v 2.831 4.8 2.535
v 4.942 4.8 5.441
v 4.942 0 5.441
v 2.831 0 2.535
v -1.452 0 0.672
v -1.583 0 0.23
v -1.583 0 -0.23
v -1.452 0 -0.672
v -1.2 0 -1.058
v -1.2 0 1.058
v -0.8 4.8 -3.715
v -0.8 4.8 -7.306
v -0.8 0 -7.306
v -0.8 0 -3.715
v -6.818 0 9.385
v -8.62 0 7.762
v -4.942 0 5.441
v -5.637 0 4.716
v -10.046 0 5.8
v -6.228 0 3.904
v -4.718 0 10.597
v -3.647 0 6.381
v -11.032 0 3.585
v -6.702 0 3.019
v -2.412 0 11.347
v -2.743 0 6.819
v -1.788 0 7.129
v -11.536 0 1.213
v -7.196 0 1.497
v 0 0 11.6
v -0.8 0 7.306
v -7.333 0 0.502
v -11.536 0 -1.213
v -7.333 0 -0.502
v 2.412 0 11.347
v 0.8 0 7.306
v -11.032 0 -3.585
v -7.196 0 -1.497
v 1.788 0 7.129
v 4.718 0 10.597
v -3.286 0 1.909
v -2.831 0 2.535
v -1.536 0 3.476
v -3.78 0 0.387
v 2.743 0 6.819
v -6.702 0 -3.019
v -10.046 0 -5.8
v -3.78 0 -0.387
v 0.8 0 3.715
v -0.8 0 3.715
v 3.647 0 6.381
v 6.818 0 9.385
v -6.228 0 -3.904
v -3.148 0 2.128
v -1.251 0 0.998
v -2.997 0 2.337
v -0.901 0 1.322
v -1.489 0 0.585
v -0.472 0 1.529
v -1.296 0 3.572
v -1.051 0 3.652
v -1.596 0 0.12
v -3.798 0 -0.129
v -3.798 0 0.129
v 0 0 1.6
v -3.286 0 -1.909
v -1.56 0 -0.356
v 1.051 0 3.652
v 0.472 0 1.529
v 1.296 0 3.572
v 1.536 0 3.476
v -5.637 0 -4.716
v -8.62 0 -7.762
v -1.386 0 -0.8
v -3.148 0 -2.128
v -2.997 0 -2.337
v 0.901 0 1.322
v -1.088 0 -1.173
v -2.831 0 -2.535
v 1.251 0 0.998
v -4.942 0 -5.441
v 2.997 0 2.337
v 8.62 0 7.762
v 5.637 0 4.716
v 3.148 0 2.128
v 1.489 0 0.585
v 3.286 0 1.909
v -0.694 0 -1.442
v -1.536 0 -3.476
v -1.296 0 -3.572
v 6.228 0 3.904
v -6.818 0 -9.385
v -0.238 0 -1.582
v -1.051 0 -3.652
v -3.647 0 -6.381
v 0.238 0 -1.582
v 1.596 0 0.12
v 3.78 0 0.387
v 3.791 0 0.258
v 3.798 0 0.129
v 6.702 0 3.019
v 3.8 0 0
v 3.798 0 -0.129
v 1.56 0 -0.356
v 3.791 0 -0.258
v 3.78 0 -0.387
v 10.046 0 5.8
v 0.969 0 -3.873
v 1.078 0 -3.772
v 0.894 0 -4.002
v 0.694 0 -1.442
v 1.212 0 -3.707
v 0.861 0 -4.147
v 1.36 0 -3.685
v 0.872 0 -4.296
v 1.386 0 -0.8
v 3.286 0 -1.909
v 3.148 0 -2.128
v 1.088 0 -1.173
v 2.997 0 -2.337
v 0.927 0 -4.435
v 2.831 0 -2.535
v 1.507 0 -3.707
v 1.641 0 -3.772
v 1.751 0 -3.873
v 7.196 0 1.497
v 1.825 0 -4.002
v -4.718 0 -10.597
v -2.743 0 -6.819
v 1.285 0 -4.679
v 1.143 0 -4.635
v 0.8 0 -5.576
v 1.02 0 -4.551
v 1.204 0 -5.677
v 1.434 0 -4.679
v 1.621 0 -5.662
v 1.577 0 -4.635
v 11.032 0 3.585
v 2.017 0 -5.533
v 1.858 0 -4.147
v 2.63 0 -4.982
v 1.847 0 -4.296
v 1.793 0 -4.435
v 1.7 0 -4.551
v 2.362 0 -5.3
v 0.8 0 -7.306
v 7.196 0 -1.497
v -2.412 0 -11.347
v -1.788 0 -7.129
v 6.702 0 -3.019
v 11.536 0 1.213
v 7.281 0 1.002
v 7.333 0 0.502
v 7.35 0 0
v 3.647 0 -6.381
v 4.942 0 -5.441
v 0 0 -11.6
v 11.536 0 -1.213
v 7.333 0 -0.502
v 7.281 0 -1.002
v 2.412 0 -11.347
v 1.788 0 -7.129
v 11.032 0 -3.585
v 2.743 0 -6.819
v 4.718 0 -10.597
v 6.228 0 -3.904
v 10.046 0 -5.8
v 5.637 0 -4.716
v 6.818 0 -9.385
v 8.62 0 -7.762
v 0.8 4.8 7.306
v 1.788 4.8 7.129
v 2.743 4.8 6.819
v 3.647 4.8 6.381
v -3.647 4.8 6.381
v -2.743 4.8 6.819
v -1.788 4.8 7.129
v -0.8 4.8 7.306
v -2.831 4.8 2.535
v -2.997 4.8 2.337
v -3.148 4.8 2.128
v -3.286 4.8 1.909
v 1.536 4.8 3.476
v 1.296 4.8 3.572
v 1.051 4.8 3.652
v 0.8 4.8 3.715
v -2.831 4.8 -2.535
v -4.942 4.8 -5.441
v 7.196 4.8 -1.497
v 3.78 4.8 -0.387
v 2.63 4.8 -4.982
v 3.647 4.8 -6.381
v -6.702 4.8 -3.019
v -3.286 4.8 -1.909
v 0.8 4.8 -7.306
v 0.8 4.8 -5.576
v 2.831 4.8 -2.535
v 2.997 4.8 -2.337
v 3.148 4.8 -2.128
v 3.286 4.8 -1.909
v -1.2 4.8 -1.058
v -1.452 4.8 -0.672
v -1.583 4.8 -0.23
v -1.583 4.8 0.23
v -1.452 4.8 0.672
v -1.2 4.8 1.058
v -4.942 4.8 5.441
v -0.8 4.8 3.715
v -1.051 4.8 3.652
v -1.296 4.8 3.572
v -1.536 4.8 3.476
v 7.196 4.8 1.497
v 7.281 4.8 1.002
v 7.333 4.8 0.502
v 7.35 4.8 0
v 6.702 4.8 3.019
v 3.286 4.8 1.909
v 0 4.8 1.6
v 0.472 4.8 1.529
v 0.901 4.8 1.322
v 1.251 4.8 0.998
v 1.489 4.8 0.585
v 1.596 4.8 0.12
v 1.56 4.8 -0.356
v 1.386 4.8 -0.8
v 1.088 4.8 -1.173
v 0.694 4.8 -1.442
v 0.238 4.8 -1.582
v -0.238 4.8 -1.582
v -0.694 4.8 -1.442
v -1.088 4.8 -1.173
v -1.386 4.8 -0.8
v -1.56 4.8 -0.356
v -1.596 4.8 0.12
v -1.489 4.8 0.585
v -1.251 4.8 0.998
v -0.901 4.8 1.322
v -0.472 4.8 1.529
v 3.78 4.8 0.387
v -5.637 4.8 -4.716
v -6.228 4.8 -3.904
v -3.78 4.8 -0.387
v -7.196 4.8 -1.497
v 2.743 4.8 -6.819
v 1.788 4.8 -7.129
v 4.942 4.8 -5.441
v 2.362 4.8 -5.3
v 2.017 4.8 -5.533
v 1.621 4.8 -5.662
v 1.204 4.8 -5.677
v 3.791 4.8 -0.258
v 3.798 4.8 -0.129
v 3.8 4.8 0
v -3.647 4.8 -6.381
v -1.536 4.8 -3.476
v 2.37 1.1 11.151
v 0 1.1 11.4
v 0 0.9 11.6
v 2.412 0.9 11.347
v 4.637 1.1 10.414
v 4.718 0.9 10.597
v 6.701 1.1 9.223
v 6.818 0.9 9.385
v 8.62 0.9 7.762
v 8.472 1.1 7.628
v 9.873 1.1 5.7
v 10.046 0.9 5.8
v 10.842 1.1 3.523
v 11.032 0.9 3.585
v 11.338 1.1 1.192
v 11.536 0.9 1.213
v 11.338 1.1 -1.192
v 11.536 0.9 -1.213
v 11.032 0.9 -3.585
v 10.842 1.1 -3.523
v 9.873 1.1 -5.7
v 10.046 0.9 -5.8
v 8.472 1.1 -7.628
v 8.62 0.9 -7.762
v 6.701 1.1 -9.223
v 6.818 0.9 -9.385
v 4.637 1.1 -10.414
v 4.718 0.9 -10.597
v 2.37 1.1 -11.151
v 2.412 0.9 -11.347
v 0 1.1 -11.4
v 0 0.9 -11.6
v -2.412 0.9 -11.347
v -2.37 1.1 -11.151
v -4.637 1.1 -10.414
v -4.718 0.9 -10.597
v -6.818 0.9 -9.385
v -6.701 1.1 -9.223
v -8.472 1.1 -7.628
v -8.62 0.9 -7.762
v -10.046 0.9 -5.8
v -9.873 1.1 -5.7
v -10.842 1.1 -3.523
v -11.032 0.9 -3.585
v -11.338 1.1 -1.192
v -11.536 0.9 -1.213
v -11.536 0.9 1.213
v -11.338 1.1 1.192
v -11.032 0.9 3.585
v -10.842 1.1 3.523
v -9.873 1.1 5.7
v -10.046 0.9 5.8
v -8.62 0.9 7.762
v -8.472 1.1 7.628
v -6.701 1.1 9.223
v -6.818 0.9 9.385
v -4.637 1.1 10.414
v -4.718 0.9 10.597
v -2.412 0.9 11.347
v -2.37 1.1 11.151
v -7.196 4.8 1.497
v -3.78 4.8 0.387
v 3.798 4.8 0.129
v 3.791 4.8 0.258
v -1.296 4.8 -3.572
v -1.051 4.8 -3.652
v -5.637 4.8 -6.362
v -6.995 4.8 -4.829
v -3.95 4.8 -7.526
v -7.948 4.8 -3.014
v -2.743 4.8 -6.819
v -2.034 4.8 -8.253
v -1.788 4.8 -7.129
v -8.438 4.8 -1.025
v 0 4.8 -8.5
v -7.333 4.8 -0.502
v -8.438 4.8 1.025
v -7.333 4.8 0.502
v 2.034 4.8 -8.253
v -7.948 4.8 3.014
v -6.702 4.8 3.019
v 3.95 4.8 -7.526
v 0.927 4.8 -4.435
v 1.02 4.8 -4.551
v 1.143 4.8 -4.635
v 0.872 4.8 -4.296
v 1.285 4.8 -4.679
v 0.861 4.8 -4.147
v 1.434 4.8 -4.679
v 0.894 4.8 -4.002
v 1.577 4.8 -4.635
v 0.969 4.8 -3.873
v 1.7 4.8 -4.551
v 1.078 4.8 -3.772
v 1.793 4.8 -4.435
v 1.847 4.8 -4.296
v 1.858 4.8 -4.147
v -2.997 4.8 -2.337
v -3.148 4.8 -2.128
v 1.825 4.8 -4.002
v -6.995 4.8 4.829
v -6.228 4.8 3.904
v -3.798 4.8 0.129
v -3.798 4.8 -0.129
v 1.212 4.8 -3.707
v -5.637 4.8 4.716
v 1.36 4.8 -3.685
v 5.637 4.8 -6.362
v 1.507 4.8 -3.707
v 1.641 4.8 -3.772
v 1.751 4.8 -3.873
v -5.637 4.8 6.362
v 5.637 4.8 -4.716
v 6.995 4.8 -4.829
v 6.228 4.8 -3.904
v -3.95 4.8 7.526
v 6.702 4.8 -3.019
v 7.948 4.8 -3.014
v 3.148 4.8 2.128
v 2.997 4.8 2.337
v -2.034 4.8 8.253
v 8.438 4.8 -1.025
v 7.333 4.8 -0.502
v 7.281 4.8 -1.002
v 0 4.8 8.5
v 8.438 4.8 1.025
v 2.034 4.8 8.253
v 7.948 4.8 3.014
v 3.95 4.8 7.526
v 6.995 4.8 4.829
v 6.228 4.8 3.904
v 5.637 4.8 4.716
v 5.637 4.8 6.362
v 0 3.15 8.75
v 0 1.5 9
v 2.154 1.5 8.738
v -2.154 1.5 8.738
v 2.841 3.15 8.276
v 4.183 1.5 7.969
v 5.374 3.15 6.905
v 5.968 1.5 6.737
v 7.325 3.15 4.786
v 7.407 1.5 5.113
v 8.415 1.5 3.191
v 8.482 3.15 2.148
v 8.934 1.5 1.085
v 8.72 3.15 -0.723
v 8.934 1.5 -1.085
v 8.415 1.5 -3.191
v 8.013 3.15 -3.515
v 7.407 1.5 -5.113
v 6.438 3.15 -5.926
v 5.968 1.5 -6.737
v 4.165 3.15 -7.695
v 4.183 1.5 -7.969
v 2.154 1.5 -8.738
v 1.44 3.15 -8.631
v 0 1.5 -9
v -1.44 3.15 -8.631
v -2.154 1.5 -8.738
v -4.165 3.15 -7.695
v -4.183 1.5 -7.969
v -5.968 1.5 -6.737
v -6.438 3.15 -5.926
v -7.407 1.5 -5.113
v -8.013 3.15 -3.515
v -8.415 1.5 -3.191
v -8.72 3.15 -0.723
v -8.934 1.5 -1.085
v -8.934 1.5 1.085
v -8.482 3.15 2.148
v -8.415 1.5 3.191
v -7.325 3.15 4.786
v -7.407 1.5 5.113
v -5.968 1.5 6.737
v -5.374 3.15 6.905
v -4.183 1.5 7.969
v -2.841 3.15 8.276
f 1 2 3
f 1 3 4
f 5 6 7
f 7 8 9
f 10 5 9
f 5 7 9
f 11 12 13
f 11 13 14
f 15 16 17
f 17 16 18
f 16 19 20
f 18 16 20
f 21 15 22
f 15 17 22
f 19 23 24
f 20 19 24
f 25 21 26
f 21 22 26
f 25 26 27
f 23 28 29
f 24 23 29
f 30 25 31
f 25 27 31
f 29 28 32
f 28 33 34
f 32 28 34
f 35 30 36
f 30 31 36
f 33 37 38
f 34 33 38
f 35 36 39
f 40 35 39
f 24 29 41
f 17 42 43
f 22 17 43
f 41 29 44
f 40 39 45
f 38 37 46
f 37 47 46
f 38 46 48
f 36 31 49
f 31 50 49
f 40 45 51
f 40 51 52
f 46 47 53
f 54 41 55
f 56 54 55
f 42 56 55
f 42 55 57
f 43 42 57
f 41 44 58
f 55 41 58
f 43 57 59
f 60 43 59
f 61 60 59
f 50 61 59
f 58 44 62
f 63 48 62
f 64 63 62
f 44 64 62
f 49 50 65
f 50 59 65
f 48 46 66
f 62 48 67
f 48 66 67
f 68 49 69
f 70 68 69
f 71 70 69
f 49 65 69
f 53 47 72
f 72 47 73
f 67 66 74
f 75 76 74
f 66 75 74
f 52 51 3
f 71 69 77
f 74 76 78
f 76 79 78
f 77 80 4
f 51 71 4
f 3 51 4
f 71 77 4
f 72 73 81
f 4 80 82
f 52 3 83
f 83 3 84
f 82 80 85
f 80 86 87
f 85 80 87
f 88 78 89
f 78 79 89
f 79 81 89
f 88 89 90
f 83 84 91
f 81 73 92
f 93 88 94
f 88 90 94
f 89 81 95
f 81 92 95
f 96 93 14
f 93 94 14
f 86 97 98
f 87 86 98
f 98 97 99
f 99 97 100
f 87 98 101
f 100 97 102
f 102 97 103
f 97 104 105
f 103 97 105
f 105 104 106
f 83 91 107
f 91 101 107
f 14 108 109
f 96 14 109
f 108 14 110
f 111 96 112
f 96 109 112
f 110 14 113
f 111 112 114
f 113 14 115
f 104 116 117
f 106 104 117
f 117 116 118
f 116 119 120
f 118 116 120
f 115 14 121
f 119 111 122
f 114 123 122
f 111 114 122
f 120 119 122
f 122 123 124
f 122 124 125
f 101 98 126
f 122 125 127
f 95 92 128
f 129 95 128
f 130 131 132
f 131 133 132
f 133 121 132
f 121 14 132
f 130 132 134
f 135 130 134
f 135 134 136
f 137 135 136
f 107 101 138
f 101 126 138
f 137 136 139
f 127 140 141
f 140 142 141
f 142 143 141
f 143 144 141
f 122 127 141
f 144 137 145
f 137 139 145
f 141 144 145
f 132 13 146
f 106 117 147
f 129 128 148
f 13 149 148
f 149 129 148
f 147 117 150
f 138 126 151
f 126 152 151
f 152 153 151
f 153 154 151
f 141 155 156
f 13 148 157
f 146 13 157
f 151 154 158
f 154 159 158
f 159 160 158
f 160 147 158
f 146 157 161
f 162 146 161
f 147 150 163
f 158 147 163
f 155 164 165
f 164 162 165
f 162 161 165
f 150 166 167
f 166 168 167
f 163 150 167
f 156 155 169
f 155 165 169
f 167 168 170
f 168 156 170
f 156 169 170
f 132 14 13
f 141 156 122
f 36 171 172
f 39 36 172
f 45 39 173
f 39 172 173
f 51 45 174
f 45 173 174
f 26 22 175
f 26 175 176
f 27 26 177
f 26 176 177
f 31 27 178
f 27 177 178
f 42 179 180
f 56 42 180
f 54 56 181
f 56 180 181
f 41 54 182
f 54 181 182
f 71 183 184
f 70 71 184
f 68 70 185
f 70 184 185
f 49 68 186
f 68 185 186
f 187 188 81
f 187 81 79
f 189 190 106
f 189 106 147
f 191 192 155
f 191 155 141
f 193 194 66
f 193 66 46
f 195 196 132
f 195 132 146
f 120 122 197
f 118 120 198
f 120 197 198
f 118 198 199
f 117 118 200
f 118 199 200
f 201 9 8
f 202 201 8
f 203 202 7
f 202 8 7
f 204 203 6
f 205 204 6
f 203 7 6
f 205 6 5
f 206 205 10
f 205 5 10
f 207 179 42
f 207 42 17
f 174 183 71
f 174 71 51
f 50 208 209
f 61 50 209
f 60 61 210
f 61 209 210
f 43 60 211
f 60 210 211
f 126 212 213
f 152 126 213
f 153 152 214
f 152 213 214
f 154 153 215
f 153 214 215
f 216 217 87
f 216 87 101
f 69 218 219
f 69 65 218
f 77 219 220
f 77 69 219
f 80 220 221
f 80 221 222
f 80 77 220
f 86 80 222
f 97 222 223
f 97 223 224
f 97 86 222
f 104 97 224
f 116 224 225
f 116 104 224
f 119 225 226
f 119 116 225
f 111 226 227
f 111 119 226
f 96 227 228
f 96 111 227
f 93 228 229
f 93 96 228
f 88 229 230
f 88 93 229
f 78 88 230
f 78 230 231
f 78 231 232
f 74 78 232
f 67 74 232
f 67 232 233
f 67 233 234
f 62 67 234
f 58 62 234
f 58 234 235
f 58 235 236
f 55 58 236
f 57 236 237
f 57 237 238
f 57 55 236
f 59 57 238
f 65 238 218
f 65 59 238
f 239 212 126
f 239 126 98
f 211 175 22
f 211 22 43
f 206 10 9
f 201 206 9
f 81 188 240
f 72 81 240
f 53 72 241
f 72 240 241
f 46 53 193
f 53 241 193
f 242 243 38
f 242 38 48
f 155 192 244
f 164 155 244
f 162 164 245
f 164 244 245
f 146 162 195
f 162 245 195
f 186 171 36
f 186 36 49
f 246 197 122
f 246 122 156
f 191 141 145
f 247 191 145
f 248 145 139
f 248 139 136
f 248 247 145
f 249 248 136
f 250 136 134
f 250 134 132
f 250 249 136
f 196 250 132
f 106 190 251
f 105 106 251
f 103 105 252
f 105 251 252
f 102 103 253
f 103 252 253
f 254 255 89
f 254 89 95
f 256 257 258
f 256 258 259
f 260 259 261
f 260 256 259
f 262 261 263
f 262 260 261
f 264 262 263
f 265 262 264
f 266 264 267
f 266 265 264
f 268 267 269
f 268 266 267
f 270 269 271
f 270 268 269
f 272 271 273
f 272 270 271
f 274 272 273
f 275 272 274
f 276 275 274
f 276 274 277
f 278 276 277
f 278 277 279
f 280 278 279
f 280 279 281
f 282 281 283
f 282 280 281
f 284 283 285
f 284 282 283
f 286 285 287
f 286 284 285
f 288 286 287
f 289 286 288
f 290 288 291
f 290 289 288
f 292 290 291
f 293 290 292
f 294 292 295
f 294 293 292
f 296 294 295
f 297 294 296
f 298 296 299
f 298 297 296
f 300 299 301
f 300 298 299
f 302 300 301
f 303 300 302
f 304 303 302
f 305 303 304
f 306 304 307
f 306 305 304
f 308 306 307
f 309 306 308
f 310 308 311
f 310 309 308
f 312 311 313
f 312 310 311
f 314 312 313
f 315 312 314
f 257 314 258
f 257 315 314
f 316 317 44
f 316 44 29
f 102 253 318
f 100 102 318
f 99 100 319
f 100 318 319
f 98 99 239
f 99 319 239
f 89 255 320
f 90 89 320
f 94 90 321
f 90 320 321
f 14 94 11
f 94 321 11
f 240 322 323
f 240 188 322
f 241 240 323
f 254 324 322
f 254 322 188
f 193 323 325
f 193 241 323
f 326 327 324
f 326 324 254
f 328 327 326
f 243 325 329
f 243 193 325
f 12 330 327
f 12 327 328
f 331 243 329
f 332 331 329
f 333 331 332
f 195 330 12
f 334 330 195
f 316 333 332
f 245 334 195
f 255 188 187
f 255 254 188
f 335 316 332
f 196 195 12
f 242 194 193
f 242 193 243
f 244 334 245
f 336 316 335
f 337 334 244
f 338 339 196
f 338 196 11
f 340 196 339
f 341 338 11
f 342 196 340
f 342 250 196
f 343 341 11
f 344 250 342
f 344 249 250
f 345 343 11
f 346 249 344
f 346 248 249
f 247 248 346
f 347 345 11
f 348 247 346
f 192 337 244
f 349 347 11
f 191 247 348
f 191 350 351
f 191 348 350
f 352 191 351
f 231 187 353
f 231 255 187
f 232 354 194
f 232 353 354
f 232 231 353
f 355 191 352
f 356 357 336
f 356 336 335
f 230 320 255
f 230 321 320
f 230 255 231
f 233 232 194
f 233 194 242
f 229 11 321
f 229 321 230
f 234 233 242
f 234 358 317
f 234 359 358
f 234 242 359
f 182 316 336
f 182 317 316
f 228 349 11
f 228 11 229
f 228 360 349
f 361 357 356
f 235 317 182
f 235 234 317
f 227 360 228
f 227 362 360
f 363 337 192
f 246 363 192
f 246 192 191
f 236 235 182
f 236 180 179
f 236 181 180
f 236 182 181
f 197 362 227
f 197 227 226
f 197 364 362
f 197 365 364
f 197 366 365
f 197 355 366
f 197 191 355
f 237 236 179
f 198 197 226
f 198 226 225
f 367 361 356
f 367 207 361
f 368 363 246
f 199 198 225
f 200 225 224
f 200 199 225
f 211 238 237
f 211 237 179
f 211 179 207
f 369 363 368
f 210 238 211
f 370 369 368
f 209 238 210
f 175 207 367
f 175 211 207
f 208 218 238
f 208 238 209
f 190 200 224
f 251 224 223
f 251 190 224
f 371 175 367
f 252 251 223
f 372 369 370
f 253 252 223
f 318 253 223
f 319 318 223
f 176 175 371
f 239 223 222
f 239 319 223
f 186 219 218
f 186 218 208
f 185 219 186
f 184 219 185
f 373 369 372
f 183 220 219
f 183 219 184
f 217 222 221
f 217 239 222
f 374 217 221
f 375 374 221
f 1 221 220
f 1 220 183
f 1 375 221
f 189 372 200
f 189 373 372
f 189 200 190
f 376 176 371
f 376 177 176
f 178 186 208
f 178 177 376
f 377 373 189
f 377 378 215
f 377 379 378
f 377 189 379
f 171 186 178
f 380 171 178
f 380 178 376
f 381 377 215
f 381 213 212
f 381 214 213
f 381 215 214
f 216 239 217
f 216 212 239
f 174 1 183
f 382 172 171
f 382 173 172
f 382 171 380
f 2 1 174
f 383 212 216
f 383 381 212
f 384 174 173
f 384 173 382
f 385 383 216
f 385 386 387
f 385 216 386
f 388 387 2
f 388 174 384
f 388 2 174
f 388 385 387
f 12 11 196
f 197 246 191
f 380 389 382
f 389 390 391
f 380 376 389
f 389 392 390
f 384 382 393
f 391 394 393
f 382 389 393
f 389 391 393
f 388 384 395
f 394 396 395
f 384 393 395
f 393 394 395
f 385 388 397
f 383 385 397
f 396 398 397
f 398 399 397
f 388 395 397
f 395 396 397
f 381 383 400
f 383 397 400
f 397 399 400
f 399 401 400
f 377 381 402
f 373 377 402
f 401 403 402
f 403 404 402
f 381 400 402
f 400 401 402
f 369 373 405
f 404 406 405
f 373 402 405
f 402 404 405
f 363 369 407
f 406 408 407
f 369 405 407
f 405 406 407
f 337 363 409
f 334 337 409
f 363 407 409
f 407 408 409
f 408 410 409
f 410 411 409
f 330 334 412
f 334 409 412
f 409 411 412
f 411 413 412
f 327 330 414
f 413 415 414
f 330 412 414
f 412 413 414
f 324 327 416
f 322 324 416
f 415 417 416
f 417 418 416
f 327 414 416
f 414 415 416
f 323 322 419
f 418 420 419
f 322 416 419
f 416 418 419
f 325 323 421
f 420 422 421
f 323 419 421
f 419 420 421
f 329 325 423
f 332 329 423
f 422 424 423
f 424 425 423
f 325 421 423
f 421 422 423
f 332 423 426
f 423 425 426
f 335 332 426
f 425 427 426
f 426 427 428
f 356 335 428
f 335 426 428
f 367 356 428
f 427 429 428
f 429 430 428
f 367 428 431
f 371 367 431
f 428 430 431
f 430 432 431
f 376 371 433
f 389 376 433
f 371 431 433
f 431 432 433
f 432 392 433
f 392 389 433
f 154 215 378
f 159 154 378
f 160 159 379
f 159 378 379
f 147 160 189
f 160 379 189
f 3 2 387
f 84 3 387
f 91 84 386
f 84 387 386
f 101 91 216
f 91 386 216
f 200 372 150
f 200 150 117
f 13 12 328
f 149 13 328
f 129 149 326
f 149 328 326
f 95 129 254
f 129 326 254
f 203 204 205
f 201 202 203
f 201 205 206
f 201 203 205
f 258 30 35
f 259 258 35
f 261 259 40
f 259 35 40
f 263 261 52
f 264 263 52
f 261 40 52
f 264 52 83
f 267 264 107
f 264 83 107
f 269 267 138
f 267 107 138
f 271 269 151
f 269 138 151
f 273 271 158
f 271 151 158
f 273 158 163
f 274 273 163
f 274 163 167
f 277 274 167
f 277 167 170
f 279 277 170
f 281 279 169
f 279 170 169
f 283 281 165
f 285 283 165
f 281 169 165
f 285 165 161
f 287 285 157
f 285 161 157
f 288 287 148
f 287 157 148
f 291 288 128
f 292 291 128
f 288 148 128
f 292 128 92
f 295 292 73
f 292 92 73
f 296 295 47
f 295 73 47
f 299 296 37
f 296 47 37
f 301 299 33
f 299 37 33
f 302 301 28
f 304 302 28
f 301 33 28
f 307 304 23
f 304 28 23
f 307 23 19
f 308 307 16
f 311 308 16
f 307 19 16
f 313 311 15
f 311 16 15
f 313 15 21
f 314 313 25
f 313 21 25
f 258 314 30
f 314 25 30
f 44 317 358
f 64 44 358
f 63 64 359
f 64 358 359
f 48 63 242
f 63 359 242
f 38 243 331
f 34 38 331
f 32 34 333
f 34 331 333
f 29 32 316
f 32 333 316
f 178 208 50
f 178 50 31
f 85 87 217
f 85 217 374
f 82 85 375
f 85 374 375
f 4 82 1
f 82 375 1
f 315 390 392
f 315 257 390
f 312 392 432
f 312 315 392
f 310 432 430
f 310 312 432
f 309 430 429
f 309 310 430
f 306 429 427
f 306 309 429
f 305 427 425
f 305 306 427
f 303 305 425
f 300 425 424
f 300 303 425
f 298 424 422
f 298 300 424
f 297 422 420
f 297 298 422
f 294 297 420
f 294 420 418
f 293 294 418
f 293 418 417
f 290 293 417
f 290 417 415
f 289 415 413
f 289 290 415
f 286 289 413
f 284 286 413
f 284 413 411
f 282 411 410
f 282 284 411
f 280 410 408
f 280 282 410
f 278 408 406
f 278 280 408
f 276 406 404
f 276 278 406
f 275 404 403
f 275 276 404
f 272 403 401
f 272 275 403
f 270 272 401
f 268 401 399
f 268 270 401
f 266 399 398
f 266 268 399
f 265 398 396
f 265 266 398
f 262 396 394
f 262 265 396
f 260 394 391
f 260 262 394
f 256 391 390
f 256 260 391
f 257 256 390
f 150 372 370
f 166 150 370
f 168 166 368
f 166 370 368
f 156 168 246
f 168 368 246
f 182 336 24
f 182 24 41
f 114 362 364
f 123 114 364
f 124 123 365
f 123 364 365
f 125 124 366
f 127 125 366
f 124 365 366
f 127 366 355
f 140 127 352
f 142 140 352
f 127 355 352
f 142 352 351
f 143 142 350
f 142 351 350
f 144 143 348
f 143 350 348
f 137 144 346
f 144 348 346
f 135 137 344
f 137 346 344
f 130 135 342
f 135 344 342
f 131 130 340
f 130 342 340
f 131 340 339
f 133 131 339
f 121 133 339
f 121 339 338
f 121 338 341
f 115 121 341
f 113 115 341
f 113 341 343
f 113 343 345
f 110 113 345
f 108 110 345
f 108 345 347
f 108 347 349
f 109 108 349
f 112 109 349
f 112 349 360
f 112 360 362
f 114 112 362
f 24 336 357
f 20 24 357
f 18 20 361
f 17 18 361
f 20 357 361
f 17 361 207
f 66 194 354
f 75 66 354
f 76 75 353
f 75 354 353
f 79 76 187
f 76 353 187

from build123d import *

# Parameters (mm, degrees)
SKETCH_4_R               = 11.6
SKETCH_4_R_2             = 1.6
EXTRUDE_1_DEPTH          = 1.1
EXTRUDE_START            = 1.5
SKETCH_4_3_R             = 9
SKETCH_4_3_R_2           = 1.6
EXTRUDE_2_DEPTH          = 3.3
CHAMFER_1_SIZE           = 0.2
SKETCH_4_4_R             = 1.6
CUT_EXTRUDE_2_DEPTH      = 18.092688495
CHAMFER_2_SIZE           = 0.5
CHAMFER_2_SIZE_2         = 3.3
CUT_EXTRUDE_4_DEPTH      = 18.092688495
EXTRUDE_3_DEPTH          = 4.8
PATTERN_CIRCULAR_2_COUNT = 10
SKETCH_6_R               = 1.5
EXTRUDE_4_DEPTH          = 4.8
SKETCH_6_3_R             = 0.5
CUT_EXTRUDE_5_DEPTH      = 18.092688495
EXTRUDE_5_DEPTH          = 4.8


with BuildPart() as part:
    # 草图4 → 凸台-拉伸1 (new body)
    with BuildSketch(Plane(origin=(0, 0, 0), x_dir=(1, 0, 0), z_dir=(0, 1, 0))):
        with Locations(Location((0, 0, 0), (0, 0, 270))):
            Circle(SKETCH_4_R)
        with Locations(Location((0, 0, 0), (0, 0, 270))):
            Circle(SKETCH_4_R_2, mode=Mode.SUBTRACT)
    extrude(amount=EXTRUDE_1_DEPTH)

    # 倒角1
    chamfer_1_edges = [part.edges().sort_by_distance(p)[0] for p in [
        (0, 1.1, -11.6),
    ]]
    chamfer(chamfer_1_edges, length=CHAMFER_1_SIZE)


with BuildPart() as body_2:
    # 草图4<3> → 凸台-拉伸2 (new body)
    with BuildSketch(Plane(origin=(0, 0, 0), x_dir=(1, 0, 0), z_dir=(0, 1, 0)).offset(EXTRUDE_START)):
        with Locations(Location((0, 0, 0), (0, 0, 270))):
            Circle(SKETCH_4_3_R)
        with Locations(Location((0, 0, 0), (0, 0, 270))):
            Circle(SKETCH_4_3_R_2, mode=Mode.SUBTRACT)
    extrude(amount=EXTRUDE_2_DEPTH)


    add(part.part)  # loft_1 joins it to this body
    # loft up to a face of the part (loft_1)
    loft([Face(Wire([body_2.edges().sort_by_distance((-6.560717647, 1.5, -6.160923953))[0]])), Face(Wire([body_2.edges().sort_by_distance((8.310242353, 1.1, -7.803837008))[0]]))])

    # 草图4<4> → 切除-拉伸2 (cut, through all)
    with BuildSketch(Plane(origin=(0, 0, 0), x_dir=(1, 0, 0), z_dir=(0, 1, 0))):
        with Locations(Location((0, 0, 0), (0, 0, 270))):
            Circle(SKETCH_4_4_R)
    extrude(amount=CUT_EXTRUDE_2_DEPTH, mode=Mode.SUBTRACT)

    # 倒角2
    # the kernel refuses this chamfer: 3.3, 0.5 mm, written as the material it takes off along each edge
    with BuildSketch(Plane(origin=(0, 4.8, 0), x_dir=(0, 0, 1), z_dir=(-1, 0, 0))) as chamfer_2_piece_1:
        Polygon((9 - CHAMFER_2_SIZE, 0), (9, -CHAMFER_2_SIZE_2), (9, 0), align=None)
    revolve(axis=Axis((0, 4.8, 0), (0, 1, 0)), mode=Mode.SUBTRACT)

    # 草图5 → 切除-拉伸4 (cut, through all)
    with BuildSketch(Plane(origin=(0, 4.8, 0), x_dir=(1, 0, 0), z_dir=(0, 1, 0))):
        with BuildLine():
            ThreePointArc((3.8, 0), (-2.387467277, -2.9563491), (-0.8, 3.714835124))
            Line((-0.8, 3.714835124), (-0.8, 7.30633287))
            ThreePointArc((-0.8, 7.30633287), (-4.906246019, -5.47277352), (7.35, 0))
            ThreePointArc((7.35, 0), (5.47277352, 4.906246019), (0.8, 7.30633287))
            Line((0.8, 7.30633287), (0.8, 3.714835124))
            ThreePointArc((0.8, 3.714835124), (2.9563491, 2.387467277), (3.8, 0))
        make_face()
        with BuildLine():
            Line((-0.8, 7.30633287), (-0.8, 3.714835124))
            ThreePointArc((-0.8, 3.714835124), (-0.402260194, 3.778648798), (0, 3.8))
            Line((0, 3.8), (0, 7.35))
            ThreePointArc((0, 7.35), (-0.400595438, 7.339075098), (-0.8, 7.30633287))
        make_face()
        with BuildLine():
            Line((0, 7.35), (0, 3.8))
            ThreePointArc((0, 3.8), (0.402260194, 3.778648798), (0.8, 3.714835124))
            Line((0.8, 3.714835124), (0.8, 7.30633287))
            ThreePointArc((0.8, 7.30633287), (0.400595438, 7.339075098), (0, 7.35))
        make_face()
    extrude(amount=-CUT_EXTRUDE_4_DEPTH, mode=Mode.SUBTRACT)


with BuildPart() as cut_extrude_4_piece_1:
    # of the separate pieces the step leaves, piece 1, a body of its own (cut_extrude_4_pieces)
    add(body_2.part.solids().sort_by_distance((0, 0.9, 11.6))[0])

    # 草图5<4> → 凸台-拉伸3 (add)
    with BuildSketch(Plane(origin=(0, 4.8, 0), x_dir=(1, 0, 0), z_dir=(0, 1, 0))):
        with BuildLine():
            Line((0, 7.35), (0, 3.8))
            ThreePointArc((0, 3.8), (0.402260194, 3.778648798), (0.8, 3.714835124))
            Line((0.8, 3.714835124), (0.8, 7.30633287))
            ThreePointArc((0.8, 7.30633287), (0.400595438, 7.339075098), (0, 7.35))
        make_face()
        with BuildLine():
            Line((-0.8, 7.30633287), (-0.8, 3.714835124))
            ThreePointArc((-0.8, 3.714835124), (-0.402260194, 3.778648798), (0, 3.8))
            Line((0, 3.8), (0, 7.35))
            ThreePointArc((0, 7.35), (-0.400595438, 7.339075098), (-0.8, 7.30633287))
        make_face()
    extrude_3 = extrude(amount=-EXTRUDE_3_DEPTH)

    # 阵列(圆周)2: 凸台-拉伸3 ×10 about axis
    pattern_circular_2_axis = Axis((0, 0, 0), (0, 1, 0))
    for i in range(1, PATTERN_CIRCULAR_2_COUNT):
        add(extrude_3.rotate(pattern_circular_2_axis, i * 360 / PATTERN_CIRCULAR_2_COUNT))



with BuildPart() as cut_extrude_4_piece_2:
    # of the separate pieces the step leaves, piece 2, a body of its own (cut_extrude_4_pieces)
    add(body_2.part.solids().sort_by_distance((-0.8, 0, -3.714835124))[0])


with BuildPart() as cut_extrude_4_piece_1_1:
    add(cut_extrude_4_piece_1.part)

    add(cut_extrude_4_piece_2.part)  # 凸台-拉伸4 merges 切除-拉伸4 piece 2
    # 草图6 → 凸台-拉伸4 (add, through all)
    with BuildSketch(Plane(origin=(0, 4.8, 0), x_dir=(1, 0, 0), z_dir=(0, 1, 0))):
        with Locations((1.359674775, 4.184648672)):
            Circle(SKETCH_6_R)
    extrude(amount=-EXTRUDE_4_DEPTH)

    # 草图6<3> → 切除-拉伸5 (cut, through all)
    with BuildSketch(Plane(origin=(0, 4.8, 0), x_dir=(1, 0, 0), z_dir=(0, 1, 0))):
        with Locations(Location((1.359674775, 4.184648672, 0), (0, 0, 270))):
            Circle(SKETCH_6_3_R)
    extrude(amount=-CUT_EXTRUDE_5_DEPTH, mode=Mode.SUBTRACT)


with BuildPart() as body_2_2:
    # 草图4<6> → 凸台-拉伸5 (new body)
    with BuildSketch(Plane(origin=(0, 0, 0), x_dir=(1, 0, 0), z_dir=(0, 1, 0))):
        with BuildLine():
            Line((-1.2, -1.058300524), (-1.2, 1.058300524))
            ThreePointArc((-1.2, 1.058300524), (-1.6, 0), (-1.2, -1.058300524))
        make_face()
    extrude(amount=EXTRUDE_5_DEPTH)


solid = Compound([cut_extrude_4_piece_1_1.part, body_2_2.part])
